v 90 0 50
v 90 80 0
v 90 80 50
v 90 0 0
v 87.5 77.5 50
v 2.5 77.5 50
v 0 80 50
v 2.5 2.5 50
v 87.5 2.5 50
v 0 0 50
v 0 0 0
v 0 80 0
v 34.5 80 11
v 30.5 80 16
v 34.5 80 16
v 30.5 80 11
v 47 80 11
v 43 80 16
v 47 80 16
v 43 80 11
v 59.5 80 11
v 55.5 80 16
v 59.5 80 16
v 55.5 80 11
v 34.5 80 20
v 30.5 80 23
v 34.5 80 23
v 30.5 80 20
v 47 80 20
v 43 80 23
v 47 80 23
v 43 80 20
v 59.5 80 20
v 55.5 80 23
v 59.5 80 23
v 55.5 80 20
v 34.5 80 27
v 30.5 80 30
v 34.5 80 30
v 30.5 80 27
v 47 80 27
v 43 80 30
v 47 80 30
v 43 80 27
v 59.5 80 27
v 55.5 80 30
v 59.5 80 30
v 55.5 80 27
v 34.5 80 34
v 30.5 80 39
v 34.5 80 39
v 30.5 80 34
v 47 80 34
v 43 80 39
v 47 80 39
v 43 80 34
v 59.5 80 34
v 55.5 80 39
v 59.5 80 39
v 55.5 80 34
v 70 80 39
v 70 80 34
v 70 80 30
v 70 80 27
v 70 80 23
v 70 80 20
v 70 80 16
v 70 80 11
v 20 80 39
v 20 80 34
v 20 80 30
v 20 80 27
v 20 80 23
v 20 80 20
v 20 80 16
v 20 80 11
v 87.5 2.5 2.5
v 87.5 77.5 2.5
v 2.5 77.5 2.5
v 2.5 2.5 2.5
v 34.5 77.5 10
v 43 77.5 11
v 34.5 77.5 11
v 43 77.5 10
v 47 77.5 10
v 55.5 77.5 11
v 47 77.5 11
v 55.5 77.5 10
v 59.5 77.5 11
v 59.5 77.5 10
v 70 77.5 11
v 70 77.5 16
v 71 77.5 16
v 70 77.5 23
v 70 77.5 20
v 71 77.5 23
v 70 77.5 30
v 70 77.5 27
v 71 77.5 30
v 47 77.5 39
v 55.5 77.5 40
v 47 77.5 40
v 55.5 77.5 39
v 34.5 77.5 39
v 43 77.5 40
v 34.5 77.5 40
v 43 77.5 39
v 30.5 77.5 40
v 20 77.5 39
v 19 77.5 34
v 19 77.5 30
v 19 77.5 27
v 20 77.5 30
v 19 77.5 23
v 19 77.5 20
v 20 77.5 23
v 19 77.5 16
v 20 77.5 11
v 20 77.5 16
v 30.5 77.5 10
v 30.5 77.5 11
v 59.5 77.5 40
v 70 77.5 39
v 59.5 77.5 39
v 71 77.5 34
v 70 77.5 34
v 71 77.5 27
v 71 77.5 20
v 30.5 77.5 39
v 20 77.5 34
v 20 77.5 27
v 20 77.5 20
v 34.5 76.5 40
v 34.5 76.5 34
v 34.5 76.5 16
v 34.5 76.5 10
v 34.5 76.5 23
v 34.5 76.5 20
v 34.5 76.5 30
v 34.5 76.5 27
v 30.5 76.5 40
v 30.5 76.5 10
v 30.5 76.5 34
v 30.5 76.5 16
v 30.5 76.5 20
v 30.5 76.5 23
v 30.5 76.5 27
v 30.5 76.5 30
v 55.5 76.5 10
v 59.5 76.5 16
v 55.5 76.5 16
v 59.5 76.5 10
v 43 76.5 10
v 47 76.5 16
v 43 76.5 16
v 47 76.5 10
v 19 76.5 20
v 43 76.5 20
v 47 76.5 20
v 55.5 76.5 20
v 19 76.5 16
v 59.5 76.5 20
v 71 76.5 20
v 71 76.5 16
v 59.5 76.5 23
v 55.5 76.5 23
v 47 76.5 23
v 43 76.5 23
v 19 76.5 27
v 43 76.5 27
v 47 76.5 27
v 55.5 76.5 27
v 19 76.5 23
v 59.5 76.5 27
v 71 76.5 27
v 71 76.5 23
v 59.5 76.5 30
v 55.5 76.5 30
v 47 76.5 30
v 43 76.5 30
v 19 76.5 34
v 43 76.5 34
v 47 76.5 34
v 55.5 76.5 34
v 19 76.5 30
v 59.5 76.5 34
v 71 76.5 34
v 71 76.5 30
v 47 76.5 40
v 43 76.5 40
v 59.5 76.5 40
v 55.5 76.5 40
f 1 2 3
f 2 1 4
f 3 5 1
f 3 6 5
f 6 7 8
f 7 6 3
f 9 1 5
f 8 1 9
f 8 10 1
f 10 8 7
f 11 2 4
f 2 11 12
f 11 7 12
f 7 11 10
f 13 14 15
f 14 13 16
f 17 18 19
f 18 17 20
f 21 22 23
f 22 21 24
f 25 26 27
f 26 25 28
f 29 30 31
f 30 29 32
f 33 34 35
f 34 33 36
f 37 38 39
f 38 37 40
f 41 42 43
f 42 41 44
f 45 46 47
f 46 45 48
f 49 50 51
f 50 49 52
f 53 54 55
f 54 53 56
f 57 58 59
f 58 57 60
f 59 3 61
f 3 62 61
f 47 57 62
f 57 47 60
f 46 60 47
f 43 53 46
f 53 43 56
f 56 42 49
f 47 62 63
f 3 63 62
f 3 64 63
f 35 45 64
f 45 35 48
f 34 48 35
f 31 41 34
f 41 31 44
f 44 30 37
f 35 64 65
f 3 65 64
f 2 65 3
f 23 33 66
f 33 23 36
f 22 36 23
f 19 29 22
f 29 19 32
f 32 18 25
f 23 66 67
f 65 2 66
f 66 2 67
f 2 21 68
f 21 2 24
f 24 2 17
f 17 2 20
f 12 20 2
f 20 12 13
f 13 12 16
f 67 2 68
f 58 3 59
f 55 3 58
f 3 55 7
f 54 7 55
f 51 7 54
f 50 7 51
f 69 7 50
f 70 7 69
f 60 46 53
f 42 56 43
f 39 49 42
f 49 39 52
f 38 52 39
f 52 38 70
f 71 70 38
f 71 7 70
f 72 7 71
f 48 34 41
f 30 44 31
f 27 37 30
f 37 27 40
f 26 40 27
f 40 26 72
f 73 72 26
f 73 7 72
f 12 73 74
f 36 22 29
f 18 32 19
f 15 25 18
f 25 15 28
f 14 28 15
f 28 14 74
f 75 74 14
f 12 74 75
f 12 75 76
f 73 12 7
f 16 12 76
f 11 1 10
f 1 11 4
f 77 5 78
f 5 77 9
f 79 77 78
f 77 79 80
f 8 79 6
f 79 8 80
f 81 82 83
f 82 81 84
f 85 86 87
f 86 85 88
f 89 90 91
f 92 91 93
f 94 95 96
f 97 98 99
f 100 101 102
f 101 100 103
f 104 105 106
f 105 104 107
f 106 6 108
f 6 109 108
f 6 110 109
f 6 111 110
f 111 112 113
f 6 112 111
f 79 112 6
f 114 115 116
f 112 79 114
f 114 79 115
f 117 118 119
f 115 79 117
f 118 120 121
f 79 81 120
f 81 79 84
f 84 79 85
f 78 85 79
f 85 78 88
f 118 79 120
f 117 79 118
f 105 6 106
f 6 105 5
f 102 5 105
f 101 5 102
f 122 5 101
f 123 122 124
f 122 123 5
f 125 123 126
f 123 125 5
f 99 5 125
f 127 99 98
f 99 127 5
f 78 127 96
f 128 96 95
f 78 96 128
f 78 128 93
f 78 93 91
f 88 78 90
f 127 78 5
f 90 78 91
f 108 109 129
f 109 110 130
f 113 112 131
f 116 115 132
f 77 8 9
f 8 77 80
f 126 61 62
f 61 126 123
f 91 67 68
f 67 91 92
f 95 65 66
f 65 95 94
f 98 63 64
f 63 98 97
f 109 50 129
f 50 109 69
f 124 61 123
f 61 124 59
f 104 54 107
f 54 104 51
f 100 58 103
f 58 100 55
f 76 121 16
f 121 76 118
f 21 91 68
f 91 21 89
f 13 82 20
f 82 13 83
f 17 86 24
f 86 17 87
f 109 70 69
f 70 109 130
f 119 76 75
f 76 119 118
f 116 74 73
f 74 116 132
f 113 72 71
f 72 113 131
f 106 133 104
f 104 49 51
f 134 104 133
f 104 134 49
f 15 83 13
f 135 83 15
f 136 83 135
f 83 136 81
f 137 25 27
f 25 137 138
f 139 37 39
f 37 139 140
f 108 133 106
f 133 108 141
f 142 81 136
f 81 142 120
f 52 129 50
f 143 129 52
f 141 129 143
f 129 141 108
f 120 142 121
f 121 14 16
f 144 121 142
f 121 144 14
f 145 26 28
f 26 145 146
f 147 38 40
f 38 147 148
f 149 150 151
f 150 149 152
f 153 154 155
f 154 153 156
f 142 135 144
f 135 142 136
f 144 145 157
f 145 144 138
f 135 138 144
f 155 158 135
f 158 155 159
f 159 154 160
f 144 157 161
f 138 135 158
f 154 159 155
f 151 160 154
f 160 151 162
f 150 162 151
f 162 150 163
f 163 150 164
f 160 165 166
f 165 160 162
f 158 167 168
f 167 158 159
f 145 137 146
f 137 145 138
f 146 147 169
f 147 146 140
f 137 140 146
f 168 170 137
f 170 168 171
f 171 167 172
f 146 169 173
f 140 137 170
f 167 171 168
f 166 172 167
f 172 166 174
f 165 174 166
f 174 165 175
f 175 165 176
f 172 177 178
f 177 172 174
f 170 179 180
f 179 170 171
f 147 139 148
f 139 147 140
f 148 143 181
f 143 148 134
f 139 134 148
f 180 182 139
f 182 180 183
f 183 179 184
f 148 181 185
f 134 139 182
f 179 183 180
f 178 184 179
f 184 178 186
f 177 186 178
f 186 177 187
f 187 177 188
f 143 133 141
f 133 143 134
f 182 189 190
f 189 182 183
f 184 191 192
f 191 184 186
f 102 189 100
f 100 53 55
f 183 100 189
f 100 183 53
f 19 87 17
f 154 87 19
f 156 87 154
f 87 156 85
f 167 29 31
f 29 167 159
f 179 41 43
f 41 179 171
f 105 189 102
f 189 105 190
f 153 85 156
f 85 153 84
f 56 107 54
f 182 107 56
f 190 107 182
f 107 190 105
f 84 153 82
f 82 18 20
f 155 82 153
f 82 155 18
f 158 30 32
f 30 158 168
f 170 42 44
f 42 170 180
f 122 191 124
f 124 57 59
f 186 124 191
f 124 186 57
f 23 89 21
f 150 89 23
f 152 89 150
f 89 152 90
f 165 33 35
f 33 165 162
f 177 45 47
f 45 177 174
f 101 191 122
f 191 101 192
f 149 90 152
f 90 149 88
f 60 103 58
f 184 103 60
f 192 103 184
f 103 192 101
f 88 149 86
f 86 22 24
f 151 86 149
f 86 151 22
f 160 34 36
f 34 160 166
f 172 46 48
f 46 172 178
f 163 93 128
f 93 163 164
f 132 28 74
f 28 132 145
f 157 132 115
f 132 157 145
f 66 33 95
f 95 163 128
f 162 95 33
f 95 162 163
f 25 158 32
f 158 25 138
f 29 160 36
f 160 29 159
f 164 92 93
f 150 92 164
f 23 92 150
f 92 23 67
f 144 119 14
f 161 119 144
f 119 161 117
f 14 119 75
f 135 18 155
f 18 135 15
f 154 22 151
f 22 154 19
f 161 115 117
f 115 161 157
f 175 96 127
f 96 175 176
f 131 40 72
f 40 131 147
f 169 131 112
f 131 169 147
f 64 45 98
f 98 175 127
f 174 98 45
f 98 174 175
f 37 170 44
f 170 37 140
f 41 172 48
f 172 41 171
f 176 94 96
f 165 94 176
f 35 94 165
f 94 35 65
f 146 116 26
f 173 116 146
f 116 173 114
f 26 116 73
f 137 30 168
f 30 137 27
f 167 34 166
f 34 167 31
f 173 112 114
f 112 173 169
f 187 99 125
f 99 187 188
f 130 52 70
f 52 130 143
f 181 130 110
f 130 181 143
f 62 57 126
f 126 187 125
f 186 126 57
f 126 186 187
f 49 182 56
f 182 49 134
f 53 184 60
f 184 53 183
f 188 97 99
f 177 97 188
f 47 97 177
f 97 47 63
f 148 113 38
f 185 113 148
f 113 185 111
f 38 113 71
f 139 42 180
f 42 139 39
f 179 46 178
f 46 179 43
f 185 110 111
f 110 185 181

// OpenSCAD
$fn = 32;

// ----------------------------------------------------------------------
// Vent box: crossgrid enclosure
// ----------------------------------------------------------------------

// --- parameters (mm) ---
box_l = 90;               // box length, X
box_w = 80;               // box width, Y
box_h = 50;               // box height, Z
wall_t = 2.5;             // shell wall thickness
win_l = 50;               // vent window width, X
win_h = 28;               // vent window height, Z
bar_w = 4;                // grid bar width
n_v = 3;                  // vertical bar count
n_h = 3;                  // horizontal bar count

win_z0 = (box_h - win_h) / 2;  // window lower edge Z
v_step = win_l / (n_v + 1);  // vertical bar step
h_step = win_h / (n_h + 1);  // horizontal bar step

difference() {
  union() {
    difference() {
      cube([box_l, box_w, box_h]);
  translate([wall_t, wall_t, wall_t])
    cube([box_l - 2 * wall_t, box_w - 2 * wall_t, box_h]);
  translate([(box_l - win_l) / 2, box_w - wall_t - 1, win_z0])
    cube([win_l, wall_t + 2, win_h]);
    }
    for (i = [1 : n_v])
      translate([(box_l - win_l) / 2 + i * v_step - bar_w / 2,
                 box_w - wall_t - 1, win_z0 - 1])
        cube([bar_w, wall_t + 1, win_h + 2]);
    for (i = [1 : n_h])
      translate([(box_l - win_l) / 2 - 1, box_w - wall_t - 1,
                 win_z0 + i * h_step - bar_w / 2])
        cube([win_l + 2, wall_t + 1, bar_w]);
  }
}
